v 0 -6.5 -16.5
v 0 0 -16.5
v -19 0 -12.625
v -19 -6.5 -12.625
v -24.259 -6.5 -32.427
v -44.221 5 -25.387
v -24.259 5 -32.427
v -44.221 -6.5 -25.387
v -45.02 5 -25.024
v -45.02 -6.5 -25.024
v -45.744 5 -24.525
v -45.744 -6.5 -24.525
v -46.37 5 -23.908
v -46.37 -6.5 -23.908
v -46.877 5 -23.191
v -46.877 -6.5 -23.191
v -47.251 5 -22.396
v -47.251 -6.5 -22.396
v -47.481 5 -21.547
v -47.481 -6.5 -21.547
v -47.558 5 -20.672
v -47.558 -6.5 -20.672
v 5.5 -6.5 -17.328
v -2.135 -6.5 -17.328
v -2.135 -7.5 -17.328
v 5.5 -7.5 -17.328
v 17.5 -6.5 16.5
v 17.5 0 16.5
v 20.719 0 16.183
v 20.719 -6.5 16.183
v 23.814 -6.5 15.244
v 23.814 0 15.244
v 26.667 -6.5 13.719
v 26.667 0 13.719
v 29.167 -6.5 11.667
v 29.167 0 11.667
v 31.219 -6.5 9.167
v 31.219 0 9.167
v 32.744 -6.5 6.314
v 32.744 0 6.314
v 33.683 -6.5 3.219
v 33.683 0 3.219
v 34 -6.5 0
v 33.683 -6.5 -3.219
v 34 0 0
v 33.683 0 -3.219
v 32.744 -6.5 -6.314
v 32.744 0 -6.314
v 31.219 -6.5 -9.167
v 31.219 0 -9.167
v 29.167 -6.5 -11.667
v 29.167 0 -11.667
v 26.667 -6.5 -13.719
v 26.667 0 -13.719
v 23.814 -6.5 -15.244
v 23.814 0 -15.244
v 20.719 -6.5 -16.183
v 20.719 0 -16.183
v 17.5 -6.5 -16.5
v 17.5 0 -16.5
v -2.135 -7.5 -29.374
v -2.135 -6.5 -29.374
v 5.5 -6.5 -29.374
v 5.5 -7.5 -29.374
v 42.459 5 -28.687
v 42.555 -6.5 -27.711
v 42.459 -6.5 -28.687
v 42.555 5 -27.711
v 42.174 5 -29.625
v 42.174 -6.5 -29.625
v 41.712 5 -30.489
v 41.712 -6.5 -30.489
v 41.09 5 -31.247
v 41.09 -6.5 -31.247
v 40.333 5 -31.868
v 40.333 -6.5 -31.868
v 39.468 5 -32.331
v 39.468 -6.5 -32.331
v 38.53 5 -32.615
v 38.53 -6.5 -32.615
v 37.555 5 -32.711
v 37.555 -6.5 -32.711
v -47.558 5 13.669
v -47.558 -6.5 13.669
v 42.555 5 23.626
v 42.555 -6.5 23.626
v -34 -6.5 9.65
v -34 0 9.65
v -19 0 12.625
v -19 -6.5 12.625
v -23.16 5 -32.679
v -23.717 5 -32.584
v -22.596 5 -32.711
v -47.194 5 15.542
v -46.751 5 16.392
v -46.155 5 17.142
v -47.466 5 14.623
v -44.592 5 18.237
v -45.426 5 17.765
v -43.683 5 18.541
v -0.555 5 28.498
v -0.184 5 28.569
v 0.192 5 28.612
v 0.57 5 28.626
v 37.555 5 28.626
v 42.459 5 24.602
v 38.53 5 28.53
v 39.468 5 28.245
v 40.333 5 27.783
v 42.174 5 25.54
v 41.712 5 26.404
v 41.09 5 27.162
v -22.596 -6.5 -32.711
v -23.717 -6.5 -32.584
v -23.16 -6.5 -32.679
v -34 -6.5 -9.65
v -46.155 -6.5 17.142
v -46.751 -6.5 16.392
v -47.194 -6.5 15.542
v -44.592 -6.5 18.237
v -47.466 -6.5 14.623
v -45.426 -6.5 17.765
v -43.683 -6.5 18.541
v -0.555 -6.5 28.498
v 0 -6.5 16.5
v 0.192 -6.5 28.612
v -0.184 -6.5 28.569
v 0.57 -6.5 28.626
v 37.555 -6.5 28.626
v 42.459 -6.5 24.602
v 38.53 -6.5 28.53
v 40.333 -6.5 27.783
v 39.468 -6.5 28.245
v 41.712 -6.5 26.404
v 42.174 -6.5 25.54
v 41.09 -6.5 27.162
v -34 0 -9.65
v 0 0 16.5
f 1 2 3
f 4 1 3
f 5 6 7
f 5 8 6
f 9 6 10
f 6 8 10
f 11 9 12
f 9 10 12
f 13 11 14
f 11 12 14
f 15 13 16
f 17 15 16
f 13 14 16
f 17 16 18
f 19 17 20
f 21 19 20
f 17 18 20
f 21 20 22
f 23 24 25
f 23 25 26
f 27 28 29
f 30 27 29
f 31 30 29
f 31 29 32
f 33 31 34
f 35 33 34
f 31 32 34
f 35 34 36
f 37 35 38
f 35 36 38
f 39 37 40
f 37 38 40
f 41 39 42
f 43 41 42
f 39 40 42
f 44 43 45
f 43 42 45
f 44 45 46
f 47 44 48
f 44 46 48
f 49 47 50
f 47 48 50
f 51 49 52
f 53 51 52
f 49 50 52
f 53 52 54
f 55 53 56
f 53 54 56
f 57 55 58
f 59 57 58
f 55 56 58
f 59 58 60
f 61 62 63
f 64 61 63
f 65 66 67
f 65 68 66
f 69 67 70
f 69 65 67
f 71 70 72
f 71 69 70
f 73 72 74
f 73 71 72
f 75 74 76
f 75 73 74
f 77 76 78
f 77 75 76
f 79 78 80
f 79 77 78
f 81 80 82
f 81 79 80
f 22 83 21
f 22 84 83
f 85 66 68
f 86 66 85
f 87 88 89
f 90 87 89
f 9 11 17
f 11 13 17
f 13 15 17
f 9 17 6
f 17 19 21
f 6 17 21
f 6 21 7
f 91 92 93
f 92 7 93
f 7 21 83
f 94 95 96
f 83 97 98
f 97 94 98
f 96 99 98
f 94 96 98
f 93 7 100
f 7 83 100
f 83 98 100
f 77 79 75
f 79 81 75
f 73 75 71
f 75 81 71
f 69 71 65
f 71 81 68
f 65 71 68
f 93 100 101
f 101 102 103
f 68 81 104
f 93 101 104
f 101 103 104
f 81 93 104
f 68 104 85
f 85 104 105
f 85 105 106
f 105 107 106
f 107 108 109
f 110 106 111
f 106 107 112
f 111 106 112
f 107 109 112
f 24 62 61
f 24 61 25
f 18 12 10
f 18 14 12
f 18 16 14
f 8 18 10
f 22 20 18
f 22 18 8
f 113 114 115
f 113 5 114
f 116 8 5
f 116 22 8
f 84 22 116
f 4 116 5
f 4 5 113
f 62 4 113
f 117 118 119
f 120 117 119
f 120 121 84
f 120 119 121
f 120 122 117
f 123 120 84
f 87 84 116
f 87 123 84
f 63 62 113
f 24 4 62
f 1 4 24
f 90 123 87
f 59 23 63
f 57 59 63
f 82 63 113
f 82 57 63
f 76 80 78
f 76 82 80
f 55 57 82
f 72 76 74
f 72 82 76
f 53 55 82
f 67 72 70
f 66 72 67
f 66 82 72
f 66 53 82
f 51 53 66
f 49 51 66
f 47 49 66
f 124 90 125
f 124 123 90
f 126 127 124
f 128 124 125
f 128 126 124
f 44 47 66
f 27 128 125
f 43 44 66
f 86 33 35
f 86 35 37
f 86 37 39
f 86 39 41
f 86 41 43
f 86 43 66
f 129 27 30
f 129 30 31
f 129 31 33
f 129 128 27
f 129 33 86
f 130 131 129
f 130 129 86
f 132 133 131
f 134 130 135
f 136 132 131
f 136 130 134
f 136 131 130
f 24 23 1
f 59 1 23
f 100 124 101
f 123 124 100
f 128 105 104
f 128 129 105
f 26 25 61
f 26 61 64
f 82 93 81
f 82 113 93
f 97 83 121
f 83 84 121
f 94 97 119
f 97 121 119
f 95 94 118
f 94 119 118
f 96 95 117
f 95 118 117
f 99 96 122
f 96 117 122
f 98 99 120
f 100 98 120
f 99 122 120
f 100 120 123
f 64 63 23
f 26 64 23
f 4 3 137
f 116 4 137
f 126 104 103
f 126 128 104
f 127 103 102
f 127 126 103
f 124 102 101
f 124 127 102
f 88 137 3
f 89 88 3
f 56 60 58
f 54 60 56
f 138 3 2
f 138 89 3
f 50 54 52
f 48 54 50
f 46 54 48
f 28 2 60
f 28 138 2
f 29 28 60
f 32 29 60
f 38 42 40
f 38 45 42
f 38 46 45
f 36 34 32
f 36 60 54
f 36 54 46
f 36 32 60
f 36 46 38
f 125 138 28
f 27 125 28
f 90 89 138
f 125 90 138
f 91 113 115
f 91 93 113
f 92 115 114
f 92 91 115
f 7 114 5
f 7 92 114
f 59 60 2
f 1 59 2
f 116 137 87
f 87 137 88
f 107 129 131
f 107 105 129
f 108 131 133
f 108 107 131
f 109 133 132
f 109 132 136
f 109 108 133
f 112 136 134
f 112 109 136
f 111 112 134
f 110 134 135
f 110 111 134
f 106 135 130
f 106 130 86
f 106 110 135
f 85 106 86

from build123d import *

# Parameters (mm, degrees)
F1_DEPTH = 6.5
F2_DEPTH = 5
F3_R     = 5
F4_W     = 7.6346651632
F4_H     = 12.0459031314
F5_DEPTH = 1


with BuildPart() as f1:
    # F0 (on Front) → F1 (new body)
    with BuildSketch(Plane.XZ):
        Polygon((42.5548888743, 28.6260936409), (31.0699325055, 28.6260936409), (0, 28.6260936409), (-47.5578345358, 17.6459699869), (-47.5578345358, -24.210675411), (-23.4520491213, -32.7111370862), (42.5548888743, -32.7111370862), align=None)
        with BuildLine():
            Line((-19, 12.625), (0, 16.5))
            Line((0, 16.5), (17.5, 16.5))
            ThreePointArc((17.5, 16.5), (34, 0), (17.5, -16.5))
            Line((17.5, -16.5), (0, -16.5))
            Line((0, -16.5), (-19, -12.625))
            Line((-19, -12.625), (-34, -9.65))
            Line((-34, -9.65), (-34, 9.65))
            Line((-34, 9.65), (-19, 12.625))
        make_face(mode=Mode.SUBTRACT)
    extrude(amount=F1_DEPTH)

    # F0 (on Front) → F2 (join)
    with BuildSketch(Plane.XZ):
        Polygon((42.5548888743, 28.6260936409), (31.0699325055, 28.6260936409), (0, 28.6260936409), (-47.5578345358, 17.6459699869), (-47.5578345358, -24.210675411), (-23.4520491213, -32.7111370862), (42.5548888743, -32.7111370862), align=None)
        with BuildLine():
            Line((-19, 12.625), (0, 16.5))
            Line((0, 16.5), (17.5, 16.5))
            ThreePointArc((17.5, 16.5), (34, 0), (17.5, -16.5))
            Line((17.5, -16.5), (0, -16.5))
            Line((0, -16.5), (-19, -12.625))
            Line((-19, -12.625), (-34, -9.65))
            Line((-34, -9.65), (-34, 9.65))
            Line((-34, 9.65), (-19, 12.625))
        make_face(mode=Mode.SUBTRACT)
        with BuildLine():
            Line((17.5, 16.5), (0, 16.5))
            Line((0, 16.5), (-19, 12.625))
            Line((-19, 12.625), (-34, 9.65))
            Line((-34, 9.65), (-34, -9.65))
            Line((-34, -9.65), (-19, -12.625))
            Line((-19, -12.625), (0, -16.5))
            Line((0, -16.5), (17.5, -16.5))
            ThreePointArc((17.5, -16.5), (34, 0), (17.5, 16.5))
        make_face()
    extrude(amount=-F2_DEPTH)

    # F3
    f3_edges = [f1.edges().sort_by_distance(p)[0] for p in [
        (42.554889, -0.75, 28.626094),
        (42.554889, -0.75, -32.711137),
        (-47.557835, -0.75, -24.210675),
        (-47.557835, -0.75, 17.64597),
        (0, -0.75, 28.626094),
        (-23.452049, -0.75, -32.711137),
    ]]
    fillet(f3_edges, radius=F3_R)

    # F4 (on face) → F5 (join)
    with BuildSketch(Plane.XZ.offset(6.5)):
        with Locations((1.6826674184, -23.3507947996)):
            Rectangle(F4_W, F4_H)
    extrude(amount=F5_DEPTH)


solid = f1.part
